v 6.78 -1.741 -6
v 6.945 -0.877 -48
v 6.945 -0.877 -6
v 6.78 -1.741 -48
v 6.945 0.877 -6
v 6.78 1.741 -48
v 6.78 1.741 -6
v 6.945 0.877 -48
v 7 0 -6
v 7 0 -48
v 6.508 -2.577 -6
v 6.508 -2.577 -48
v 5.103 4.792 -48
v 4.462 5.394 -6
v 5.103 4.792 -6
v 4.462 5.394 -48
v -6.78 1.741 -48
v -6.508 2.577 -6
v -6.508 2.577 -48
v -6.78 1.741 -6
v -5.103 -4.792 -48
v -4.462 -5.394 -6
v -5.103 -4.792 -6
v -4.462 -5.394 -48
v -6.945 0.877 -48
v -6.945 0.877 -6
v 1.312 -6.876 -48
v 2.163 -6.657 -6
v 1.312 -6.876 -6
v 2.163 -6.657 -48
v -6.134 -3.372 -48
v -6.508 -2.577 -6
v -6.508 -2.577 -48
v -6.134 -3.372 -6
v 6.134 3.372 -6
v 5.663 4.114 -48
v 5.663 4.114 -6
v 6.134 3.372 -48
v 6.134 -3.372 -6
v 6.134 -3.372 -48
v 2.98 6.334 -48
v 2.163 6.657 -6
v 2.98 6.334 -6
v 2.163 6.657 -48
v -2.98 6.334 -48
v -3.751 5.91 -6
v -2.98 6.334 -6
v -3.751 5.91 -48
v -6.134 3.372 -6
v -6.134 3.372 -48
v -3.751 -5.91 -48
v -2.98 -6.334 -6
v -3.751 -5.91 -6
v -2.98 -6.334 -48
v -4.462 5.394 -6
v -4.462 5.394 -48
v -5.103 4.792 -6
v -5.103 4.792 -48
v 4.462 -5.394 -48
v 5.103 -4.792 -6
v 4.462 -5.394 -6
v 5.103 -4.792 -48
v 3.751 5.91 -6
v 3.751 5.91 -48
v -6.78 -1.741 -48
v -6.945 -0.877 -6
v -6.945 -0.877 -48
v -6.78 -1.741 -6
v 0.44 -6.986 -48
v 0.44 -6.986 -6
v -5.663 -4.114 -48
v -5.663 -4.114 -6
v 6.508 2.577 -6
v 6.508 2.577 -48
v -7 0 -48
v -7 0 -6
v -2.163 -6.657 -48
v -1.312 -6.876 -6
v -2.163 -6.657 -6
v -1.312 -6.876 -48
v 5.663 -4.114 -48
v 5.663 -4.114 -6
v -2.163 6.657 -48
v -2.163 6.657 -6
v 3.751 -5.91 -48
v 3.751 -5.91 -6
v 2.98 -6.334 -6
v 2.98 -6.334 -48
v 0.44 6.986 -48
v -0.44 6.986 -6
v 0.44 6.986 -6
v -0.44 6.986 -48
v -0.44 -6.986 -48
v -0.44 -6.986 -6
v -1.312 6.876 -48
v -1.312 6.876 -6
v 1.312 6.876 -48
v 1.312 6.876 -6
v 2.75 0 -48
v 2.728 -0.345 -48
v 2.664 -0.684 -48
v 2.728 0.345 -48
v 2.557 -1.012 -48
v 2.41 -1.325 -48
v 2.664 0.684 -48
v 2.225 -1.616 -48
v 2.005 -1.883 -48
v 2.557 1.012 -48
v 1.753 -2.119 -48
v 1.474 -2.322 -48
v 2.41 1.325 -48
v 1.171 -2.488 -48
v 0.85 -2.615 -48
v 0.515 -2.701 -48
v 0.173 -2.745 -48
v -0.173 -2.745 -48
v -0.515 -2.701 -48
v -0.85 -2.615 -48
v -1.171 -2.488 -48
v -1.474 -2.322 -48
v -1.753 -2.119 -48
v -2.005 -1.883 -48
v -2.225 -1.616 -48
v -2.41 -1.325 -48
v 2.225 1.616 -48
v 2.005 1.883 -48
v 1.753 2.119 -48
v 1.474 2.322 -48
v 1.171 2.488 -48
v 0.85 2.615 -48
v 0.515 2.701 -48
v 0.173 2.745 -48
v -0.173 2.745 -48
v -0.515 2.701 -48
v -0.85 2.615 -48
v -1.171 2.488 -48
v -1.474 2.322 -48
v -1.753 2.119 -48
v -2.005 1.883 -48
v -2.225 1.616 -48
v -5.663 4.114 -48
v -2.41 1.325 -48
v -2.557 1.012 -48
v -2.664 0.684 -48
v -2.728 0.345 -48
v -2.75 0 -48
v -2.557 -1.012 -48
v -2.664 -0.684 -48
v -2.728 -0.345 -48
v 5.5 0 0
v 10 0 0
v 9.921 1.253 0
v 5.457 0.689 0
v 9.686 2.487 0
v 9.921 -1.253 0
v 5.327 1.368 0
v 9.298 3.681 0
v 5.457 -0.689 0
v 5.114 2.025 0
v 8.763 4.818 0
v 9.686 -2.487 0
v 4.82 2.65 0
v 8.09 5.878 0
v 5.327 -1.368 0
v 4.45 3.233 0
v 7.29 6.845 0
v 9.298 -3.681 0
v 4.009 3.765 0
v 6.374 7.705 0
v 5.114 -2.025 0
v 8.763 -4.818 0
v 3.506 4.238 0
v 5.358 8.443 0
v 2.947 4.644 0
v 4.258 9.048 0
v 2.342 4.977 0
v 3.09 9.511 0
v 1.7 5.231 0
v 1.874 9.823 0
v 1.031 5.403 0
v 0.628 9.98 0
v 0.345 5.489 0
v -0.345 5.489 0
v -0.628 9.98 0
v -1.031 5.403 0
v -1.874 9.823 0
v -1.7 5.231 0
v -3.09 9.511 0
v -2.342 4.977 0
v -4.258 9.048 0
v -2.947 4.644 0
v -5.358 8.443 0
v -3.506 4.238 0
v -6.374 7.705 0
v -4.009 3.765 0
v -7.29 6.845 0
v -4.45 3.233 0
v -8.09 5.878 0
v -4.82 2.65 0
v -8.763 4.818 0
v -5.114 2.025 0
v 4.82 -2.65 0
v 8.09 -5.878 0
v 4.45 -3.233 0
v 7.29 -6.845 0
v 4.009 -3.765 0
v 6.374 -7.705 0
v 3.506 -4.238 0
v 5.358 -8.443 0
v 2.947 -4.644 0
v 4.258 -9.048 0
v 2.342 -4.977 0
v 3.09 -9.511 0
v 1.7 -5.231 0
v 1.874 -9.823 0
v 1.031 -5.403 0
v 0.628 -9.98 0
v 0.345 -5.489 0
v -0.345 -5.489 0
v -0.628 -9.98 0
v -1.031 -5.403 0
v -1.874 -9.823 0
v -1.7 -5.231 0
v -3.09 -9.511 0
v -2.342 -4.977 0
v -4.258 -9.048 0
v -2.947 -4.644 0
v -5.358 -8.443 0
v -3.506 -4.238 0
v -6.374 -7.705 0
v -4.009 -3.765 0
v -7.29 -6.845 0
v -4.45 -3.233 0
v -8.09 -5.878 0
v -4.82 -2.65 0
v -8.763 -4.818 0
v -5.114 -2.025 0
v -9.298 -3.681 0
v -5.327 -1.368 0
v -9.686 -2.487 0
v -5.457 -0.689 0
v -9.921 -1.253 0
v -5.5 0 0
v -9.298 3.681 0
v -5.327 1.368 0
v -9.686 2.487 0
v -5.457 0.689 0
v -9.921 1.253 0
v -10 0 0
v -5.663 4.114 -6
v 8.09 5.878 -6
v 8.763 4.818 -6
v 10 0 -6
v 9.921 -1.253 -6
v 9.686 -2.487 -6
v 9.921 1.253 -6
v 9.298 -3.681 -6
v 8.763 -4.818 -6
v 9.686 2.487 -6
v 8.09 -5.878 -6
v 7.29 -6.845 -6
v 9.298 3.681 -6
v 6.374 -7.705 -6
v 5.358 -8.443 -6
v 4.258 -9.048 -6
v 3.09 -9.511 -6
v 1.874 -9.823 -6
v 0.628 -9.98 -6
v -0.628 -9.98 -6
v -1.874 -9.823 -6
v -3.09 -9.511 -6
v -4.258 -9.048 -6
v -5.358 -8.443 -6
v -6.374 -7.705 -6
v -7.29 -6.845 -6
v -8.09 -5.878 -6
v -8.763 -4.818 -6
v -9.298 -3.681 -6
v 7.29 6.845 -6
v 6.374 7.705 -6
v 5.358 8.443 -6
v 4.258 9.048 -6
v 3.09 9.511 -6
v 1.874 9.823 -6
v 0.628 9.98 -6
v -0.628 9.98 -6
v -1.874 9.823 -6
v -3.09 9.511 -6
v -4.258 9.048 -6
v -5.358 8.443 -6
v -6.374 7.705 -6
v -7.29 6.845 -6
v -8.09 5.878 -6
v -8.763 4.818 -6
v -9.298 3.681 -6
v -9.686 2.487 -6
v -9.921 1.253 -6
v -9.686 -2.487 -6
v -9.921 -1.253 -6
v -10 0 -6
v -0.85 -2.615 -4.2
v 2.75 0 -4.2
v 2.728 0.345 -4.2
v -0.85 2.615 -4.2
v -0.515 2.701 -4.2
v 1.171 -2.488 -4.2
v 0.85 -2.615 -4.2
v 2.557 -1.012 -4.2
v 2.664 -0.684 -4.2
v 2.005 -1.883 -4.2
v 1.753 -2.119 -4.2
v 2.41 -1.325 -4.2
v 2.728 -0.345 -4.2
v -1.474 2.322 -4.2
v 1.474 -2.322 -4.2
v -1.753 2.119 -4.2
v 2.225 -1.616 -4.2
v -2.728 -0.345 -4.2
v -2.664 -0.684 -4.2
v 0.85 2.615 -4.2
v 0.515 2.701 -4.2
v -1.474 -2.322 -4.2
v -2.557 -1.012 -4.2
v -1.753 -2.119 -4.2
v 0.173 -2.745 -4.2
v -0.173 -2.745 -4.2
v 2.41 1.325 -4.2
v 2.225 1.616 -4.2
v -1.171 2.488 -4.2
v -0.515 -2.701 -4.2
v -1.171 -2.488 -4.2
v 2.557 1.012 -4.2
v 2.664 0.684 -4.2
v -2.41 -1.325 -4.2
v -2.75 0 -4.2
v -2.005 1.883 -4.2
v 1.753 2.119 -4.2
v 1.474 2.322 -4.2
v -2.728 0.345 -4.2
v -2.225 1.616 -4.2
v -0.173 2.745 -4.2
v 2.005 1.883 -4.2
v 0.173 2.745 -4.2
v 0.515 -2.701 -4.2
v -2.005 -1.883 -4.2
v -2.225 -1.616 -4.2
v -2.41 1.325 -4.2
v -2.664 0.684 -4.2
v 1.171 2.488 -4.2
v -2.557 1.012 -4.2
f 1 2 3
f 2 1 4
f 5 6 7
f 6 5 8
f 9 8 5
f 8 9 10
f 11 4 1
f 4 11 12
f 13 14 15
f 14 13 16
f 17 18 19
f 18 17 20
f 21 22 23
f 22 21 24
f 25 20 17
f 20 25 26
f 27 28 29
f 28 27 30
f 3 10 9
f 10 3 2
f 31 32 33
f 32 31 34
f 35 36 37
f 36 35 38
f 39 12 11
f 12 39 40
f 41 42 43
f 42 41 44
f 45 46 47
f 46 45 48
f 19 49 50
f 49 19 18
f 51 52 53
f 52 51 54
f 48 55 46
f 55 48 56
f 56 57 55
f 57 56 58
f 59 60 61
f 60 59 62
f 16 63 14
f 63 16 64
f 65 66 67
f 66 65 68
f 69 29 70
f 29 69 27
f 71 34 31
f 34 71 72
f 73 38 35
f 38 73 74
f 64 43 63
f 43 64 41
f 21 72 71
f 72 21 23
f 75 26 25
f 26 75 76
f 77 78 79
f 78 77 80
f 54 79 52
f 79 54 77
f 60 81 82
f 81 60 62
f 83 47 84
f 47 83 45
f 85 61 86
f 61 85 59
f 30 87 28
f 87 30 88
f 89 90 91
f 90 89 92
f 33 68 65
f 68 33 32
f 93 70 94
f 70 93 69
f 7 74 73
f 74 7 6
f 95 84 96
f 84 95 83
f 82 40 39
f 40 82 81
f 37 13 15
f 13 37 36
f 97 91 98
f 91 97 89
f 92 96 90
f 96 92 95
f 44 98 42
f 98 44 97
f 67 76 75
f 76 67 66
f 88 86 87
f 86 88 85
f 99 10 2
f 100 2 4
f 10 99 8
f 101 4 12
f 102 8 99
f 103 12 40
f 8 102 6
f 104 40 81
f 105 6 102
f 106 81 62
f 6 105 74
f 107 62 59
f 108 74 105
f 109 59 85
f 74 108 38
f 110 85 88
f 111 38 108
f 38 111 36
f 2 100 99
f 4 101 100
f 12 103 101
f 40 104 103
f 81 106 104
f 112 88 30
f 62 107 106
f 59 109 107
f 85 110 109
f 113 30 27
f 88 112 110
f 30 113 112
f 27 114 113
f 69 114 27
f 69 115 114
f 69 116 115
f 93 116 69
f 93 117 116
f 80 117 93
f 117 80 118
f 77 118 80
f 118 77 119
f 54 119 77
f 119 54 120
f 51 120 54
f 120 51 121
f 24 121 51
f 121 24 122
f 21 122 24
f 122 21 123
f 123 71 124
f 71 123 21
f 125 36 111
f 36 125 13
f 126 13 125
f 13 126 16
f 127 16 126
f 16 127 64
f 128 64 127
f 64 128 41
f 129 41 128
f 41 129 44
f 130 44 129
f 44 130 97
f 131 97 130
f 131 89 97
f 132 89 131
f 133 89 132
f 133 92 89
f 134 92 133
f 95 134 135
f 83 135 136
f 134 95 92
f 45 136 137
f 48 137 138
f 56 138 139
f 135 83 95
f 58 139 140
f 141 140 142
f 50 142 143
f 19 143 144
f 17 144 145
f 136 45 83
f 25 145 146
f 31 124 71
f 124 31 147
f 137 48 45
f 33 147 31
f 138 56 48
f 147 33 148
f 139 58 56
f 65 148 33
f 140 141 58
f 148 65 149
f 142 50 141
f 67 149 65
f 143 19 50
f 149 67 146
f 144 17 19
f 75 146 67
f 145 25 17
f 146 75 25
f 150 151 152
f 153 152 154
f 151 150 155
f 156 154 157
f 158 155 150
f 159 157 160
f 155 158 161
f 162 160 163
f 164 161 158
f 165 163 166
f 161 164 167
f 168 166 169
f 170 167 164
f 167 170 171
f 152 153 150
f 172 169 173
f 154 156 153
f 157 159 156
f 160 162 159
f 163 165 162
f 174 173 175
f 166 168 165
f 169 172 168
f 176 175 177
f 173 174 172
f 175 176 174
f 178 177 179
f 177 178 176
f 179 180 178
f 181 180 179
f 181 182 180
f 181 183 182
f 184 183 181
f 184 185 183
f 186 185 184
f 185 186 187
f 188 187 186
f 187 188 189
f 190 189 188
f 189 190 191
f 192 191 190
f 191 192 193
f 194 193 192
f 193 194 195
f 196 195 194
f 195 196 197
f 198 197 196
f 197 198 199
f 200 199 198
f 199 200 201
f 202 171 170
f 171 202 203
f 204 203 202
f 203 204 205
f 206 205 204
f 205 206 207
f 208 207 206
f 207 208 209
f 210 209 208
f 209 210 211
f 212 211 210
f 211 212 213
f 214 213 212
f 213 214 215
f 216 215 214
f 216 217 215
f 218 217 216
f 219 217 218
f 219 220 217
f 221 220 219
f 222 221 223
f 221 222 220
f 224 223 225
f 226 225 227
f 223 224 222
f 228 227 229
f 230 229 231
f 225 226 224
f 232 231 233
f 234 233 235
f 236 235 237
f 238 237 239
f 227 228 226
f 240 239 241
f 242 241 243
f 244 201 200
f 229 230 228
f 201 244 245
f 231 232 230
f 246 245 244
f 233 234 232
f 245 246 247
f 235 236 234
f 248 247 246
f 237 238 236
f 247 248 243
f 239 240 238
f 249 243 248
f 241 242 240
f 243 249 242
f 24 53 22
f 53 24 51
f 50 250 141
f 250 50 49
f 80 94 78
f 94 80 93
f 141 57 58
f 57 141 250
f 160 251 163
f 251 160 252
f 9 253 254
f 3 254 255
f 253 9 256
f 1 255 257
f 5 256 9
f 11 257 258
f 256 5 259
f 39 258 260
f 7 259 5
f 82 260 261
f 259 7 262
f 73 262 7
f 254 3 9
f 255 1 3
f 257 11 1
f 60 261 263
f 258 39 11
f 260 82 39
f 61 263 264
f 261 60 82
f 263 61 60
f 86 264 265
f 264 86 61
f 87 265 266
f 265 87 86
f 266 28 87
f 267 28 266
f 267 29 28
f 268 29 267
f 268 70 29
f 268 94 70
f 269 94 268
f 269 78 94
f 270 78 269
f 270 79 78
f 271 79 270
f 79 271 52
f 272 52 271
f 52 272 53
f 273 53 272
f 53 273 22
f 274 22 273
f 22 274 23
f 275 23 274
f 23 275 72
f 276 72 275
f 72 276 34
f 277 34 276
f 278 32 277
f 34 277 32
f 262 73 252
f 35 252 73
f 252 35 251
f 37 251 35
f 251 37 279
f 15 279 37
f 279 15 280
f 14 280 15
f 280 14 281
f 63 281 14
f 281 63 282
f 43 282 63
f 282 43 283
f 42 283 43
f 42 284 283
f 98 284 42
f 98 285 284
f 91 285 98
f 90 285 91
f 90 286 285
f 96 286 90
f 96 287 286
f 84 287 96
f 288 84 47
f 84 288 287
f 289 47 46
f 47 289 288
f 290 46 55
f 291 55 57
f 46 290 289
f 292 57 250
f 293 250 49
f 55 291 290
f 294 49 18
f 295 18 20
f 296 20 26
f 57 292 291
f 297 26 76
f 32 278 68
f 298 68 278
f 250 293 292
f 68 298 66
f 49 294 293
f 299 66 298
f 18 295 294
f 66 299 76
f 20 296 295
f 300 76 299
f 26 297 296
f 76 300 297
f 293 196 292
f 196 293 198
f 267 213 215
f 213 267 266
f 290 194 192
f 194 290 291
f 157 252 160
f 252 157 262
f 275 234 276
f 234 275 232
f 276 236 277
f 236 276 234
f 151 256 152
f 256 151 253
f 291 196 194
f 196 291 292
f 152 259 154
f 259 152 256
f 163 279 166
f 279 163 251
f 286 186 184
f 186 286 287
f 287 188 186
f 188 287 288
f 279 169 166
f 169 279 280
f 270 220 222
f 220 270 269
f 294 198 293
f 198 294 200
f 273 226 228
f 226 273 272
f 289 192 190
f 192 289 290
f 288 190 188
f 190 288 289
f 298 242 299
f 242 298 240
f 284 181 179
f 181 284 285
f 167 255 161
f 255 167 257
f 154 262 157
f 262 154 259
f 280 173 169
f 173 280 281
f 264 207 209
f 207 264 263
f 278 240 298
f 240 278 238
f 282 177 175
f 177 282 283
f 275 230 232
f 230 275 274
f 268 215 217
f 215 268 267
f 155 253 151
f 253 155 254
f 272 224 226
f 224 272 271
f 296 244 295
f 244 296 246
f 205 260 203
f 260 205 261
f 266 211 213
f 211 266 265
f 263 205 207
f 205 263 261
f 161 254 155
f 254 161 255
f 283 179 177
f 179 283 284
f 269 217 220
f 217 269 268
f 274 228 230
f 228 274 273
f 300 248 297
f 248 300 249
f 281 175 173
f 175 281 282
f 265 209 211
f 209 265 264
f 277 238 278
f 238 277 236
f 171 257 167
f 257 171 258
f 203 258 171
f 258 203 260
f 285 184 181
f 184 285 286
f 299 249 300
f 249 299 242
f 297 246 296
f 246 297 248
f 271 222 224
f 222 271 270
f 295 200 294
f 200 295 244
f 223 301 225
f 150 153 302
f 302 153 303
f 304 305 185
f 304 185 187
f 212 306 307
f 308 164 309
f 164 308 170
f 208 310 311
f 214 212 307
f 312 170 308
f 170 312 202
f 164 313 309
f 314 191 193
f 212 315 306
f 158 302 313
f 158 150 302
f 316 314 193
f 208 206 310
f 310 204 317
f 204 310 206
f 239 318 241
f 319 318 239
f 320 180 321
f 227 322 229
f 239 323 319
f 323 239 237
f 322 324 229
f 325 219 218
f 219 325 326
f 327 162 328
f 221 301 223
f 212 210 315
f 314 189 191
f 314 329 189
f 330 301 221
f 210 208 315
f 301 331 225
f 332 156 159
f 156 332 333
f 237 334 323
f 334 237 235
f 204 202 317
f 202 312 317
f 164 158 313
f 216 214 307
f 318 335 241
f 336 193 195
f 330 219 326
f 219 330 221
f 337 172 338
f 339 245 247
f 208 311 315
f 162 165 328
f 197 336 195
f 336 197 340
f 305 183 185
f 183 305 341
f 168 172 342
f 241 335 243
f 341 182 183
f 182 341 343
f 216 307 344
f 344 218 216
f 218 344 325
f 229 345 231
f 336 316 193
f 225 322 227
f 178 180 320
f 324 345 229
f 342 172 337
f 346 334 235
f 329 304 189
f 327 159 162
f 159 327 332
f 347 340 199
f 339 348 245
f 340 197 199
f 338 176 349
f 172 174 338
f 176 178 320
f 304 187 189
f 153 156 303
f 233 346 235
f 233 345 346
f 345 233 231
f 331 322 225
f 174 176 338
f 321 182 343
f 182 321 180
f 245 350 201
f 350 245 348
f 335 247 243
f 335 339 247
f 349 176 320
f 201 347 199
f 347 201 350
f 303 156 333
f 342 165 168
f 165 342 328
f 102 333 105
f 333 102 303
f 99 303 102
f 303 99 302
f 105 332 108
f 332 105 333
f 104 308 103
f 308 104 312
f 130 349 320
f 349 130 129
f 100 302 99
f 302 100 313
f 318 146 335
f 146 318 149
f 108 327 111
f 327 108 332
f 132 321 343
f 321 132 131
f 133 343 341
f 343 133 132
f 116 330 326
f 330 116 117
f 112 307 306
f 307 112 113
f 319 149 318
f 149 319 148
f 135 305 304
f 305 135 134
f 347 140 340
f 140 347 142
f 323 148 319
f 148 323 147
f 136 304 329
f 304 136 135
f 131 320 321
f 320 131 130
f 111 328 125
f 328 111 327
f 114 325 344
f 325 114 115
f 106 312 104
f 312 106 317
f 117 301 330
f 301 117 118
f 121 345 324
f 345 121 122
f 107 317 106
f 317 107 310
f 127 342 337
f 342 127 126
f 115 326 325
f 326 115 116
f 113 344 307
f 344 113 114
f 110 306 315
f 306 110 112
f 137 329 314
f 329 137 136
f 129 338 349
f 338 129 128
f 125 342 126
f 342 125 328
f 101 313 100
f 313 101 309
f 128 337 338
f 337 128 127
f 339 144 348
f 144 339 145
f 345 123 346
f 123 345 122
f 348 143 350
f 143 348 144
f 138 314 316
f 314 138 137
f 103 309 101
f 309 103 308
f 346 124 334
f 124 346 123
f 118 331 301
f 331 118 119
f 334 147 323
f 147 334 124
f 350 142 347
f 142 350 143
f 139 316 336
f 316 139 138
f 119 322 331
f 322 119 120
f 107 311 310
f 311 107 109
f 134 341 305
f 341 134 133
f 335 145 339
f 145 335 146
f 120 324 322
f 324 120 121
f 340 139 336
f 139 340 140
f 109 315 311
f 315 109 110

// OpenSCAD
$fn = 50;


difference() {
	union() {
		translate(v = [0, 0, -48.0000000000]) {
			cylinder(h = 48, r = 7.0000000000);
		}
		translate(v = [0, 0, -6.0000000000]) {
			cylinder(h = 6, r = 10.0000000000);
		}
	}
	union() {
		translate(v = [0, 0, 0]) {
			rotate(a = [0, 0, 0]) {
				difference() {
					union() {
						#translate(v = [0, 0, -48.0000000000]) {
							cylinder(h = 48, r = 2.2500000000);
						}
						#translate(v = [0, 0, -4.2000000000]) {
							cylinder(h = 4.2000000000, r = 7.0000000000, r1 = 2.7500000000, r2 = 5.5000000000);
						}
						#translate(v = [0, 0, -48.0000000000]) {
							cylinder(h = 48, r = 2.7500000000);
						}
						#translate(v = [0, 0, -48.0000000000]) {
							cylinder(h = 48, r = 2.2500000000);
						}
					}
					union();
				}
			}
		}
	}
}
